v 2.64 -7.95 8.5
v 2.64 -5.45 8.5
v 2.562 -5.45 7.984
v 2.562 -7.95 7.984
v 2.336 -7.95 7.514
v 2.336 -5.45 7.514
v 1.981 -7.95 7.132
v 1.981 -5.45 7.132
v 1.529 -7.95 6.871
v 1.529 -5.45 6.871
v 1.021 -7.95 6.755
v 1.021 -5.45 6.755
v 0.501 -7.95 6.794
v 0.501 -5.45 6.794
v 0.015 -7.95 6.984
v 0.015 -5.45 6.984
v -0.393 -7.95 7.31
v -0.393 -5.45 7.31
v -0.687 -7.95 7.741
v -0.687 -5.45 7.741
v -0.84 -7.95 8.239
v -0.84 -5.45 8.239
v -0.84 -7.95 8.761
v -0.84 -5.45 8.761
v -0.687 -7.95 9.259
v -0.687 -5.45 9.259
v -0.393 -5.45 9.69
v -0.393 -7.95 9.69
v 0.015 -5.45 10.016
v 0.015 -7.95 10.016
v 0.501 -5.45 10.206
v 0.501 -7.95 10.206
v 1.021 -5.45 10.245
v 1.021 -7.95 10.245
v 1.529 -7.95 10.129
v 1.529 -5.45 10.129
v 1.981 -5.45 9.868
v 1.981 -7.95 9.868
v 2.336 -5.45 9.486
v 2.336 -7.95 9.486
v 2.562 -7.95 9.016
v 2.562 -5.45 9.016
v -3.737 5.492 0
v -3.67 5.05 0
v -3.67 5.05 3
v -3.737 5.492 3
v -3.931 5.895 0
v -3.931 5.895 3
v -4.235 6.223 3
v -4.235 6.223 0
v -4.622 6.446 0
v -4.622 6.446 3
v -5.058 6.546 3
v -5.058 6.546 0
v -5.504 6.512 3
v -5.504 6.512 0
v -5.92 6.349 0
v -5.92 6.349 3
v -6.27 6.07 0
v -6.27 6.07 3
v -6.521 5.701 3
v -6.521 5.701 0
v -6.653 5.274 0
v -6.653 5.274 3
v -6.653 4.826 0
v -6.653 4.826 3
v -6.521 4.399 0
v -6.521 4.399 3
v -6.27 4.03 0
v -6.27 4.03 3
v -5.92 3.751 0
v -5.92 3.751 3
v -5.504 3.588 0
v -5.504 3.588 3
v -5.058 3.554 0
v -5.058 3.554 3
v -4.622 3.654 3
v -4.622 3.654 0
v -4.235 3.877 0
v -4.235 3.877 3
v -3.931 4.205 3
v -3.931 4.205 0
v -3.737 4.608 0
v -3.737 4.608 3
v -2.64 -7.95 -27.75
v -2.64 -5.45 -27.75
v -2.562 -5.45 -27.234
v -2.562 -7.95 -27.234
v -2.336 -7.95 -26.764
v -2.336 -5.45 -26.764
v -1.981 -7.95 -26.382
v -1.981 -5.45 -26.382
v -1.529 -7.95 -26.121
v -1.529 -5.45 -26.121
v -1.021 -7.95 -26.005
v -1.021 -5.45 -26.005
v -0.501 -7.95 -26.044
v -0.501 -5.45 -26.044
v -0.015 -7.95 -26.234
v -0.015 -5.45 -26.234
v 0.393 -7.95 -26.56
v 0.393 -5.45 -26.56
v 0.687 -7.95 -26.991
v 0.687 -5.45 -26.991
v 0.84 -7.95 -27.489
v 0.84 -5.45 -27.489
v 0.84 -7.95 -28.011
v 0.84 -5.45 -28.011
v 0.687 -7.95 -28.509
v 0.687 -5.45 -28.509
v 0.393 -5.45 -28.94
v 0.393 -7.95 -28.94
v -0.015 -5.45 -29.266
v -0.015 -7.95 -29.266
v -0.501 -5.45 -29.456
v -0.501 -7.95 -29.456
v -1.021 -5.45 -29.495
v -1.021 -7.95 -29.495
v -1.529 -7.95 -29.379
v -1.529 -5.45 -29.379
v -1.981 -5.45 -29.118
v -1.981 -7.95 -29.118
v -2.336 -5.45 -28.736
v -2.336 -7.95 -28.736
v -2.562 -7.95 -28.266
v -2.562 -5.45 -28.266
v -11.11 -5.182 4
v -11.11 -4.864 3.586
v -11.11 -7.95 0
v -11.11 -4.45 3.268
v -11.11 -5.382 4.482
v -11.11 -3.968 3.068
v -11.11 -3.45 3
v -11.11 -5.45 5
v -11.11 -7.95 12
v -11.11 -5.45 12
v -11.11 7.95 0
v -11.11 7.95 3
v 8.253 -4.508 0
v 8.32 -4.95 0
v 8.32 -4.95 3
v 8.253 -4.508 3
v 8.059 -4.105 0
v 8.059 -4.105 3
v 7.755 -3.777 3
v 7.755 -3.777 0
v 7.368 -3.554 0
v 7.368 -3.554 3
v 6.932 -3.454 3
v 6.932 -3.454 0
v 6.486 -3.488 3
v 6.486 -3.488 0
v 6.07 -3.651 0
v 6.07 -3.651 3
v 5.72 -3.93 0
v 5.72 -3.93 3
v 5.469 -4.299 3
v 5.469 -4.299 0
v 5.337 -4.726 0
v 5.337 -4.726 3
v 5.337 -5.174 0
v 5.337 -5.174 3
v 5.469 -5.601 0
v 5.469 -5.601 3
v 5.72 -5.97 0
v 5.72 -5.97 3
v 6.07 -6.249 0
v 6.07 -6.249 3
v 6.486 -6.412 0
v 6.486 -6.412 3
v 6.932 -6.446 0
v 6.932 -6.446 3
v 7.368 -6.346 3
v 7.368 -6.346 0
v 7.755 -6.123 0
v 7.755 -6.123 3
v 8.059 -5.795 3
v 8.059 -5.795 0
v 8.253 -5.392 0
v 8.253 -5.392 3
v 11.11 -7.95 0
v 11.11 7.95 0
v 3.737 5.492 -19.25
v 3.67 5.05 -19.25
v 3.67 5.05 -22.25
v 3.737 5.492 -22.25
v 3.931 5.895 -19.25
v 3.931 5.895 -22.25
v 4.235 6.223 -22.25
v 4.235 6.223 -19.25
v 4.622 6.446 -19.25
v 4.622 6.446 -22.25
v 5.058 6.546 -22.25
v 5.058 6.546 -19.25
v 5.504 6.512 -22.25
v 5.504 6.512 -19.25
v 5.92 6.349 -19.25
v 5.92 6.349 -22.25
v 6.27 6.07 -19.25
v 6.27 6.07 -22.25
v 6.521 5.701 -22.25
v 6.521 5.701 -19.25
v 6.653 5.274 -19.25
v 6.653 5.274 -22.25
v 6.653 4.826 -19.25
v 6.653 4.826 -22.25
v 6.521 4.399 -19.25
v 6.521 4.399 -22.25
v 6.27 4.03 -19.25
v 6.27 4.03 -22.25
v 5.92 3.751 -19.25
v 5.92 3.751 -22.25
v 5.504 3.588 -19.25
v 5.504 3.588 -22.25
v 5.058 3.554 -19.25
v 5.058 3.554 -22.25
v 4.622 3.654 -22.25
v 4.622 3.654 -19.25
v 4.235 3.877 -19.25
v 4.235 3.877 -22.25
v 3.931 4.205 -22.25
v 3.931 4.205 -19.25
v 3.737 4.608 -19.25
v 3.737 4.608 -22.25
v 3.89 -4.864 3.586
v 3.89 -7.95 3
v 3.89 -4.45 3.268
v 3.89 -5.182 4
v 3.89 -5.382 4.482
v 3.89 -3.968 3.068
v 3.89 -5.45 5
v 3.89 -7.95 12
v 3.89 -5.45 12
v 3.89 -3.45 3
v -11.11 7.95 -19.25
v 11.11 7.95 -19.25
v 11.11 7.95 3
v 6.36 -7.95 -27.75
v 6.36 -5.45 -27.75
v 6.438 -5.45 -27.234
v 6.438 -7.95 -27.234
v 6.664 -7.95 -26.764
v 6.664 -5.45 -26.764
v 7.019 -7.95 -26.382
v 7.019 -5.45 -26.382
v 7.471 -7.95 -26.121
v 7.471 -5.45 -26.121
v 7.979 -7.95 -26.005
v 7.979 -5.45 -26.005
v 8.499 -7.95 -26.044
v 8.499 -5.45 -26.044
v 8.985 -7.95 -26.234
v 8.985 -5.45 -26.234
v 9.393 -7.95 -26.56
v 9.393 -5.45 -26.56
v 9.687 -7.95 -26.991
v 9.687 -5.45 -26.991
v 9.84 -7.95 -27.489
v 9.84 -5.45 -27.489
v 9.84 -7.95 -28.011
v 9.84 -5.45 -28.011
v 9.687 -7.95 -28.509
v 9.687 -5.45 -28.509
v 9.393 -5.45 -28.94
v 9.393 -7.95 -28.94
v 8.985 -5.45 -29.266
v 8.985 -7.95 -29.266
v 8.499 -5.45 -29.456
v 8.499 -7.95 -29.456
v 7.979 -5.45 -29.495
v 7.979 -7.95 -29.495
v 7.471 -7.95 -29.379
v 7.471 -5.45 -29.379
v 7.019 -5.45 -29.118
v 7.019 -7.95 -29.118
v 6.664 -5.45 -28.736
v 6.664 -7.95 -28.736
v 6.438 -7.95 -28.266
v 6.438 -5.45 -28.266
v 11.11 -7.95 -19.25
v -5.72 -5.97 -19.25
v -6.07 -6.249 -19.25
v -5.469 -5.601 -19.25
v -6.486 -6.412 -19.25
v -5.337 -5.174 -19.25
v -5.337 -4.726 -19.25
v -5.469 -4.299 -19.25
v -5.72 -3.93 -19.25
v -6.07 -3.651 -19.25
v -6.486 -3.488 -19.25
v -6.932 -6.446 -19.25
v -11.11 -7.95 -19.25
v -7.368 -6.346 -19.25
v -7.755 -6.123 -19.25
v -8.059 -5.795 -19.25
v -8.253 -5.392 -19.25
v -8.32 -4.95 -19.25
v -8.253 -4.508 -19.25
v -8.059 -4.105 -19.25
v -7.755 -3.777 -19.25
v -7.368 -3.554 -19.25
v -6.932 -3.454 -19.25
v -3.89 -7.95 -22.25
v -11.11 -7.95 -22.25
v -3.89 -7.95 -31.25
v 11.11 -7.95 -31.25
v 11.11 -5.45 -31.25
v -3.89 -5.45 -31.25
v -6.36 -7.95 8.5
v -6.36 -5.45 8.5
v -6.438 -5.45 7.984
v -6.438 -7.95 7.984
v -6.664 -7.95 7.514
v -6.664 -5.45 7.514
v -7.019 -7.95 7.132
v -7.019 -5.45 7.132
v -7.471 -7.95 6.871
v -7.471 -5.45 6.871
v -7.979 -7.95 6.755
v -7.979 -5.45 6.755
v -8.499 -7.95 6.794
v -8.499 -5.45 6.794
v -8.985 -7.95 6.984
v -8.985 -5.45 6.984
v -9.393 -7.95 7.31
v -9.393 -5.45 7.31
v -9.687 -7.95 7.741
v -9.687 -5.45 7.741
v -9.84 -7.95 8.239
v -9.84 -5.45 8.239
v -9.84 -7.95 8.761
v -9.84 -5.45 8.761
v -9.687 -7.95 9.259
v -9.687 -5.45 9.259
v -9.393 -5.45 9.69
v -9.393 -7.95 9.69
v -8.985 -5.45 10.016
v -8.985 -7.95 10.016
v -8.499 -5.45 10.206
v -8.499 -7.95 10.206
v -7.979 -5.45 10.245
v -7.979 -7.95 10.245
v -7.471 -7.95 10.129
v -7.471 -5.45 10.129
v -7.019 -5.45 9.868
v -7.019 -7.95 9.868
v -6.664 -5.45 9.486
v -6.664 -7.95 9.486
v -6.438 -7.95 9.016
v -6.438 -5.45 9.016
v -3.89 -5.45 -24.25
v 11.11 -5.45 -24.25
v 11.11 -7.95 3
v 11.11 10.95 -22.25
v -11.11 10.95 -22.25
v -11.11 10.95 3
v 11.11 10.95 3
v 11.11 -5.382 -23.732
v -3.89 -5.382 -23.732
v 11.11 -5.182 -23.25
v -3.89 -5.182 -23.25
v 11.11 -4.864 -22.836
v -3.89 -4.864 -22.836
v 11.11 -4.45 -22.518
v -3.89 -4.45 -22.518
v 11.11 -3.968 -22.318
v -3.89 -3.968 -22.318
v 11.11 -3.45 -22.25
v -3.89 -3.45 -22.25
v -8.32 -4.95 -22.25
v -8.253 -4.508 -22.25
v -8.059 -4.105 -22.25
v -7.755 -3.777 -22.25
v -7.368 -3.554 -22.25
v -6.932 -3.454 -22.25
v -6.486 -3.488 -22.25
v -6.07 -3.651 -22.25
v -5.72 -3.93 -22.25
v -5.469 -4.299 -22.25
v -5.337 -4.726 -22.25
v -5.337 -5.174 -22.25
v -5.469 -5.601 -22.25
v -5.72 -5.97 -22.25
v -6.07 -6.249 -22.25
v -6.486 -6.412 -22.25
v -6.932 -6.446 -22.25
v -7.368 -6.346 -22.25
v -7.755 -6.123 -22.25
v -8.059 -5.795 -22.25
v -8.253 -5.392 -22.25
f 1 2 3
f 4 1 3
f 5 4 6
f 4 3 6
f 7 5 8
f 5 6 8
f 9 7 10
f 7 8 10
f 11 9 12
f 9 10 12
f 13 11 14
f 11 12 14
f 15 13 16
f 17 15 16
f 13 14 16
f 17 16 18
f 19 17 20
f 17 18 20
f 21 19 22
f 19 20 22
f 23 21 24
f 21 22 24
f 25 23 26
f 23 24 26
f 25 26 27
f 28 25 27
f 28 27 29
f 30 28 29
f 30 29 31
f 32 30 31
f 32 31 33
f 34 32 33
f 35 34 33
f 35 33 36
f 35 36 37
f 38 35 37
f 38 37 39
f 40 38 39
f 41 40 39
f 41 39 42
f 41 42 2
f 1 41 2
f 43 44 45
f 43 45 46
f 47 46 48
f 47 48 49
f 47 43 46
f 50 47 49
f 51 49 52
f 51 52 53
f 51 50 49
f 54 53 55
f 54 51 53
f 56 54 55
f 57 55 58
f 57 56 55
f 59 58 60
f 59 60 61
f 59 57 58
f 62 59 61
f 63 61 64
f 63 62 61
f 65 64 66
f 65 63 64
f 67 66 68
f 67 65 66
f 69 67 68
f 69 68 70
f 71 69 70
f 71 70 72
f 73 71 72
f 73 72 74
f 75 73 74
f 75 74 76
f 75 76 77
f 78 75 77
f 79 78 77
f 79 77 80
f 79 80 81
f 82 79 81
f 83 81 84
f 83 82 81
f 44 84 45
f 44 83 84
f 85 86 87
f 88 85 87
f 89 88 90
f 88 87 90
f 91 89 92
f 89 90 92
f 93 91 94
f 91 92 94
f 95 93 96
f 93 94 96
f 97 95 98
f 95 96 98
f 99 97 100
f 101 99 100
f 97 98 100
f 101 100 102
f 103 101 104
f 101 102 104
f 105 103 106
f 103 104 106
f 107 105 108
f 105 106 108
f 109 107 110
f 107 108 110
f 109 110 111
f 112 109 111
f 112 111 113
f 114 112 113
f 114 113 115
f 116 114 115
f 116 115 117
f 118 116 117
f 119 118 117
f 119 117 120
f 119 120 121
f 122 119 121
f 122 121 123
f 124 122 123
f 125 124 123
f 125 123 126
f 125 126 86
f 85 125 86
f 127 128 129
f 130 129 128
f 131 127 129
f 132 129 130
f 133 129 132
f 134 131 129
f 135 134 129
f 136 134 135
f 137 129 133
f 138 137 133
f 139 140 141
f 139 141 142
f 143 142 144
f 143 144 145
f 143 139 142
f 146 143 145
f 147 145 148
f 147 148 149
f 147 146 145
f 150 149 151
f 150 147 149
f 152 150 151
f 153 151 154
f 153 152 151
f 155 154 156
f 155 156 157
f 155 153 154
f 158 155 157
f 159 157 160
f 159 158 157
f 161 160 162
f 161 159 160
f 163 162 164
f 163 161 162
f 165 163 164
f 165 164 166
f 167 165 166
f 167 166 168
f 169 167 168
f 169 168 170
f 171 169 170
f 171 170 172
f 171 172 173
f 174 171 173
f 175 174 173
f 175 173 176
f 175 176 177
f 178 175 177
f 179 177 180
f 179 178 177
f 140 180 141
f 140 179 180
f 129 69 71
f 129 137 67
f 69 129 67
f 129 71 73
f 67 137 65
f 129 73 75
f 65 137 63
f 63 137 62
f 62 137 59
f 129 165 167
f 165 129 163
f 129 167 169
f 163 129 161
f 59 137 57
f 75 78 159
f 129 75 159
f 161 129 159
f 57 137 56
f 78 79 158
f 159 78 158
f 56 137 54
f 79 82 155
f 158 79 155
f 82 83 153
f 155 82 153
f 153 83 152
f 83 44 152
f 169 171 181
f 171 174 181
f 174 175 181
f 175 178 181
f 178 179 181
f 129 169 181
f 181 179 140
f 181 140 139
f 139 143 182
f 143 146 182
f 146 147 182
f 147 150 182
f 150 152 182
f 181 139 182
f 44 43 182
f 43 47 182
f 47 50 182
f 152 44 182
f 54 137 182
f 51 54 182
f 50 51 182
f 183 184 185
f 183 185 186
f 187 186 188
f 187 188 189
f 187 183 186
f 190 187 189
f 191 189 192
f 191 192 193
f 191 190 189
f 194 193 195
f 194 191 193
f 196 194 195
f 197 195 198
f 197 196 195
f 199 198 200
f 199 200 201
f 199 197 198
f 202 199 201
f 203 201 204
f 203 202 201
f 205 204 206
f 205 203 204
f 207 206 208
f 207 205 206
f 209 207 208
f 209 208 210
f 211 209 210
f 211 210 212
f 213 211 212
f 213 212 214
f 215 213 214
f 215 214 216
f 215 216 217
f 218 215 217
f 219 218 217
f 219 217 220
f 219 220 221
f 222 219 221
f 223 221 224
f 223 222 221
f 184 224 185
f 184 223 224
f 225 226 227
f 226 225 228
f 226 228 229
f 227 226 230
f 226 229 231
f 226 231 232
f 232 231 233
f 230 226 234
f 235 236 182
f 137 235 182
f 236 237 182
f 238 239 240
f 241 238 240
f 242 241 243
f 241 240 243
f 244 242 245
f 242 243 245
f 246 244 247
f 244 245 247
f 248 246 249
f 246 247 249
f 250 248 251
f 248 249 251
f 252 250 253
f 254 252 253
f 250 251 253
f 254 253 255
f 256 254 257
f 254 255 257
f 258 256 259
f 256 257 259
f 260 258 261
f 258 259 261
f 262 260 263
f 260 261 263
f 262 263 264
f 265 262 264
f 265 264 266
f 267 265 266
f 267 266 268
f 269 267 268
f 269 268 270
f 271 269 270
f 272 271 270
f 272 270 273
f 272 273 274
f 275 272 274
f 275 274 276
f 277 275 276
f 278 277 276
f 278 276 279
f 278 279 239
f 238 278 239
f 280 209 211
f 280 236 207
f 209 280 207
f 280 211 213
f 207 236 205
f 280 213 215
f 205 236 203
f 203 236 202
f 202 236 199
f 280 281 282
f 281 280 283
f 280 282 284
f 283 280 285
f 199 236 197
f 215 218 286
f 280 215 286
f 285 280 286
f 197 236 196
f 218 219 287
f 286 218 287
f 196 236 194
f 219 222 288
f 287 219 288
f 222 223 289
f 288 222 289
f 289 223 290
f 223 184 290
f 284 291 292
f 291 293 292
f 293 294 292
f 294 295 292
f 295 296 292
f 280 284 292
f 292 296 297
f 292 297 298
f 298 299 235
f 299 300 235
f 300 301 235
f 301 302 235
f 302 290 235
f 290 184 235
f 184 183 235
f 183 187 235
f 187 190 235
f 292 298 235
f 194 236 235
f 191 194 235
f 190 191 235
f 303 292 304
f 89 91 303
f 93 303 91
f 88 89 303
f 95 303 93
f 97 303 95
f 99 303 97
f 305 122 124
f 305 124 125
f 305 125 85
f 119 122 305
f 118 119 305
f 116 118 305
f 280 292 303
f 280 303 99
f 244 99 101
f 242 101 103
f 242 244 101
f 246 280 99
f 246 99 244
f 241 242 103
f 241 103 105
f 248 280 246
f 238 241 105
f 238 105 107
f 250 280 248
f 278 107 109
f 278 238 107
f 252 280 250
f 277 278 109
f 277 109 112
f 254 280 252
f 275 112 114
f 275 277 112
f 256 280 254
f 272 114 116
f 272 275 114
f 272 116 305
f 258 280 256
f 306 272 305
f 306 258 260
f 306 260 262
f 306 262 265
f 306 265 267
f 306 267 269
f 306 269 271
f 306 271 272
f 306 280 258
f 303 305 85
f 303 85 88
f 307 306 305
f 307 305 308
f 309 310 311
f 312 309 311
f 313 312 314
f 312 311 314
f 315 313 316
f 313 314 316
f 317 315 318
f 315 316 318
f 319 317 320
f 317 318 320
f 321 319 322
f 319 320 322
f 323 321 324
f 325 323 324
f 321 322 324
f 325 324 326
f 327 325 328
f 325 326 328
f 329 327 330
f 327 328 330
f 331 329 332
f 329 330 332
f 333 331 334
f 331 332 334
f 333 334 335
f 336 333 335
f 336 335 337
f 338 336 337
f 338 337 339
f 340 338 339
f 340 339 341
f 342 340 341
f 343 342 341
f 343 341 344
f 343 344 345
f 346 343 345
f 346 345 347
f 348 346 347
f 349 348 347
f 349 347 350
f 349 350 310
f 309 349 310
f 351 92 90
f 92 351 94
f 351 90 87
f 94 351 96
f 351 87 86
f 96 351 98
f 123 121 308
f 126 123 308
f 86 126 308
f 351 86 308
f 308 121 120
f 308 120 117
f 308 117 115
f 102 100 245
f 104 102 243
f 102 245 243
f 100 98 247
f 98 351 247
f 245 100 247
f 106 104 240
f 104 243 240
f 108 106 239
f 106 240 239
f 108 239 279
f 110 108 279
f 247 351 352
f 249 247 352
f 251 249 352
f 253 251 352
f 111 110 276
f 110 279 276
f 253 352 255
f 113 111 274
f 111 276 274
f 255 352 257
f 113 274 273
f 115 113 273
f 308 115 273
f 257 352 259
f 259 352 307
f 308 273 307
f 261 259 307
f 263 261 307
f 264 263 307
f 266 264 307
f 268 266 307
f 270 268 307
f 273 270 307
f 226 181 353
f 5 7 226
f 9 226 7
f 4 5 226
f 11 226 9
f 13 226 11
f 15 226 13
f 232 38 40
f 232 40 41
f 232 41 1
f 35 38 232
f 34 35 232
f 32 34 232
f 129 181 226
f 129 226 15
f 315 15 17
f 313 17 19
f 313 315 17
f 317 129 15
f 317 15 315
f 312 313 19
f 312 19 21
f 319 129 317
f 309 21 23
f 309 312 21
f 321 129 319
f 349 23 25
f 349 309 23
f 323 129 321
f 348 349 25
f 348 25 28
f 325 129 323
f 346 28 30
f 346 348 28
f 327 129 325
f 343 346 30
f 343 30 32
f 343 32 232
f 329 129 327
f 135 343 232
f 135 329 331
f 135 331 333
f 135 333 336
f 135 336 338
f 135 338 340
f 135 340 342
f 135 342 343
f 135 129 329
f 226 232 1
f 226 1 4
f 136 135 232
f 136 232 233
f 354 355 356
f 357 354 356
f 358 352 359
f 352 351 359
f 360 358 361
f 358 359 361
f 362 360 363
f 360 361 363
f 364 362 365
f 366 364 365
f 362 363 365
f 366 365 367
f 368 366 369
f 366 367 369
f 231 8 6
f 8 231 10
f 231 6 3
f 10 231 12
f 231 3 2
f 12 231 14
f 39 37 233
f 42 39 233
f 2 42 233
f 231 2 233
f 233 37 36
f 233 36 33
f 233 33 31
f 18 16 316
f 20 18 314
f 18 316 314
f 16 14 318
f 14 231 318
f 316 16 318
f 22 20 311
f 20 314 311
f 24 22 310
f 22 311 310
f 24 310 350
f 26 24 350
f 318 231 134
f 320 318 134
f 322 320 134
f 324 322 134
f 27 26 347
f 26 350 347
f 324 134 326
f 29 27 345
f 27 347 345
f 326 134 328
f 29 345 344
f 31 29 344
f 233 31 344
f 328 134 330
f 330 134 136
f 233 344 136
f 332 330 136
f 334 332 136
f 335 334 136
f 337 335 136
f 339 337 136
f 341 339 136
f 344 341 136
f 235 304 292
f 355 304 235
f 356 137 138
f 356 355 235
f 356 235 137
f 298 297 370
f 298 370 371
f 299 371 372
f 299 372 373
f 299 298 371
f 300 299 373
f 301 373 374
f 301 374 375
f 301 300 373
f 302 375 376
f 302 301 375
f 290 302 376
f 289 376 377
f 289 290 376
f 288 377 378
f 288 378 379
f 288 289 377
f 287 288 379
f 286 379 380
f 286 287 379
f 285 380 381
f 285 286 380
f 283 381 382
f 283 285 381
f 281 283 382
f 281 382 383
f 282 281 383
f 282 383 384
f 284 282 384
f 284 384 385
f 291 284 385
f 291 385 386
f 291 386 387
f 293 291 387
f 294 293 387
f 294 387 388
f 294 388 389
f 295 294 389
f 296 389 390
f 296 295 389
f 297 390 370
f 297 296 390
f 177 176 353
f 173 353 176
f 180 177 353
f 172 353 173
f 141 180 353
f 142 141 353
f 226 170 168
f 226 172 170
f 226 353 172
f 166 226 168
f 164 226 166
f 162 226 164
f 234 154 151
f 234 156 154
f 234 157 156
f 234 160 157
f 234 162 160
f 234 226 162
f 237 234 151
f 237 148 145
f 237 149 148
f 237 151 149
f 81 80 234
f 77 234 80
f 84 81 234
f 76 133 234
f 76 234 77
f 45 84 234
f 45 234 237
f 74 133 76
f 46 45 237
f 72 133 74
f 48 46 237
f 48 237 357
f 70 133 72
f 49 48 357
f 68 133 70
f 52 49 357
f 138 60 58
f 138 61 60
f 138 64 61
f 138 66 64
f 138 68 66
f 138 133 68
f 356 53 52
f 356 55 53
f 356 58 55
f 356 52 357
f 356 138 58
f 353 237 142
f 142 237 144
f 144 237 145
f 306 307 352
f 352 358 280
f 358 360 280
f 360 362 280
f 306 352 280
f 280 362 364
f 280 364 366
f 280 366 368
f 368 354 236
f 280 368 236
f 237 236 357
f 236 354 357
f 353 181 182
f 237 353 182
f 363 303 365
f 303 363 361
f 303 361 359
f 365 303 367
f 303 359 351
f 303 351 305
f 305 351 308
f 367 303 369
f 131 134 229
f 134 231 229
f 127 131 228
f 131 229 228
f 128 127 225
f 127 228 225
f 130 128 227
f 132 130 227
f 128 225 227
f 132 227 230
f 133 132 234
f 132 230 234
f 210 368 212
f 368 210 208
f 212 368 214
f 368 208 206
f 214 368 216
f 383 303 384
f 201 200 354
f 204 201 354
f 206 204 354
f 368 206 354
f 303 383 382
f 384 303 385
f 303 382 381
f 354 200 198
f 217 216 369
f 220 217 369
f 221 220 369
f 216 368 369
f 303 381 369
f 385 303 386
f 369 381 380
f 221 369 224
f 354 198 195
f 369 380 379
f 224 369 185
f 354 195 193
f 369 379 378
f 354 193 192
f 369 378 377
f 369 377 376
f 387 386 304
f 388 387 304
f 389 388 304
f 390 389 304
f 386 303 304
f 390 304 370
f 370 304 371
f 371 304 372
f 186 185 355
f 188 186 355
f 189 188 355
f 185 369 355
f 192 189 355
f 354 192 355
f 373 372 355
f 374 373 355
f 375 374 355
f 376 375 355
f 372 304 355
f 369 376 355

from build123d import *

# Parameters (mm, degrees)
SKETCH1_W             = 22.22
SKETCH1_H             = 15.9
SKETCH1_R             = 1.5
BOSS_EXTRUDE1_DEPTH   = 3
SKETCH3_W             = 9
SKETCH3_H             = 2.5
BOSS_EXTRUDE2_DEPTH   = 15
FILLET2_R             = 2
CUT_EXTRUDE1_REACH    = 4.5
SKETCH5_R             = 1.75
LPATTERN2_COUNT       = 2
LPATTERN2_PITCH       = 6.95
BODY_MOVE_COPY3_ANGLE = 180
SKETCH11_W            = 22.249975
SKETCH11_H            = 3
BOSS_EXTRUDE3_DEPTH   = 22.22
SKETCH12_W            = 3
SKETCH12_H            = 3
BOSS_EXTRUDE4_DEPTH   = 22.22


with BuildPart() as part:
    # Sketch1 → Boss-Extrude1 (new body)
    with BuildSketch(Plane.XY):
        Rectangle(SKETCH1_W, SKETCH1_H)
        with Locations((-5.17, 5.05)):
            Circle(SKETCH1_R, mode=Mode.SUBTRACT)
        with Locations((6.82, -4.95)):
            Circle(SKETCH1_R, mode=Mode.SUBTRACT)
    extrude(amount=BOSS_EXTRUDE1_DEPTH)

    # Sketch3 → Boss-Extrude2 (add)
    with BuildSketch(Plane.ZY.offset(11.11)):
        with Locations((7.5, -6.7)):
            Rectangle(SKETCH3_W, SKETCH3_H)
    extrude(amount=-BOSS_EXTRUDE2_DEPTH)

    # Fillet2
    fillet2_edges = [part.edges().sort_by_distance(p)[0] for p in [
        (-3.61, -5.45, 3),
    ]]
    fillet(fillet2_edges, radius=FILLET2_R)

    # Sketch5 → Cut-Extrude1 (cut, up to next)
    with BuildSketch(Plane(origin=(0, -5.45, 0), x_dir=(1, 0, 0), z_dir=(0, 1, 0)), mode=Mode.PRIVATE) as cut_extrude1_sk1:
        with Locations((-8.11, -8.5)):
            Circle(SKETCH5_R)
    cut_extrude1_tool1 = extrude(cut_extrude1_sk1.sketch, amount=-CUT_EXTRUDE1_REACH, mode=Mode.PRIVATE) & part.part
    add(cut_extrude1_tool1.solids().sort_by_distance((-8.11, -5.45, 8.5))[0], mode=Mode.SUBTRACT)
    # Sketch5 → Cut-Extrude1 (cut, up to next)
    with BuildSketch(Plane(origin=(0, -5.45, 0), x_dir=(1, 0, 0), z_dir=(0, 1, 0)), mode=Mode.PRIVATE) as cut_extrude1_sk2:
        with Locations((0.89, -8.5)):
            Circle(SKETCH5_R)
    cut_extrude1_tool2 = extrude(cut_extrude1_sk2.sketch, amount=-CUT_EXTRUDE1_REACH, mode=Mode.PRIVATE) & part.part
    add(cut_extrude1_tool2.solids().sort_by_distance((0.89, -5.45, 8.5))[0], mode=Mode.SUBTRACT)


with BuildPart() as lpattern2_1:
    # LPattern2: pattern copy
    add(part.part.moved(Location(Vector(0, 0, -1) * (1 * LPATTERN2_PITCH))))


with BuildPart() as lpattern2_1_1:
    # Body-Move/Copy3: moved
    add(lpattern2_1.part.rotate(Axis((1.25e-05, 0, -13.0999875), (0, 1, 0)), BODY_MOVE_COPY3_ANGLE))

    # Sketch11 → Boss-Extrude3 (add)
    with BuildSketch(Plane.ZY.offset(11.109975)):
        with Locations((-11.1249875, 9.45)):
            Rectangle(SKETCH11_W, SKETCH11_H)
    extrude(amount=-BOSS_EXTRUDE3_DEPTH)


with BuildPart() as part_1:
    add(part.part)

    add(lpattern2_1_1.part)  # Boss-Extrude4 merges LPattern2_1
    # Sketch12 → Boss-Extrude4 (add)
    with BuildSketch(Plane.ZY.offset(11.109975)):
        with Locations((1.5, 9.45)):
            Rectangle(SKETCH12_W, SKETCH12_H)
    extrude(amount=-BOSS_EXTRUDE4_DEPTH)


solid = part_1.part
